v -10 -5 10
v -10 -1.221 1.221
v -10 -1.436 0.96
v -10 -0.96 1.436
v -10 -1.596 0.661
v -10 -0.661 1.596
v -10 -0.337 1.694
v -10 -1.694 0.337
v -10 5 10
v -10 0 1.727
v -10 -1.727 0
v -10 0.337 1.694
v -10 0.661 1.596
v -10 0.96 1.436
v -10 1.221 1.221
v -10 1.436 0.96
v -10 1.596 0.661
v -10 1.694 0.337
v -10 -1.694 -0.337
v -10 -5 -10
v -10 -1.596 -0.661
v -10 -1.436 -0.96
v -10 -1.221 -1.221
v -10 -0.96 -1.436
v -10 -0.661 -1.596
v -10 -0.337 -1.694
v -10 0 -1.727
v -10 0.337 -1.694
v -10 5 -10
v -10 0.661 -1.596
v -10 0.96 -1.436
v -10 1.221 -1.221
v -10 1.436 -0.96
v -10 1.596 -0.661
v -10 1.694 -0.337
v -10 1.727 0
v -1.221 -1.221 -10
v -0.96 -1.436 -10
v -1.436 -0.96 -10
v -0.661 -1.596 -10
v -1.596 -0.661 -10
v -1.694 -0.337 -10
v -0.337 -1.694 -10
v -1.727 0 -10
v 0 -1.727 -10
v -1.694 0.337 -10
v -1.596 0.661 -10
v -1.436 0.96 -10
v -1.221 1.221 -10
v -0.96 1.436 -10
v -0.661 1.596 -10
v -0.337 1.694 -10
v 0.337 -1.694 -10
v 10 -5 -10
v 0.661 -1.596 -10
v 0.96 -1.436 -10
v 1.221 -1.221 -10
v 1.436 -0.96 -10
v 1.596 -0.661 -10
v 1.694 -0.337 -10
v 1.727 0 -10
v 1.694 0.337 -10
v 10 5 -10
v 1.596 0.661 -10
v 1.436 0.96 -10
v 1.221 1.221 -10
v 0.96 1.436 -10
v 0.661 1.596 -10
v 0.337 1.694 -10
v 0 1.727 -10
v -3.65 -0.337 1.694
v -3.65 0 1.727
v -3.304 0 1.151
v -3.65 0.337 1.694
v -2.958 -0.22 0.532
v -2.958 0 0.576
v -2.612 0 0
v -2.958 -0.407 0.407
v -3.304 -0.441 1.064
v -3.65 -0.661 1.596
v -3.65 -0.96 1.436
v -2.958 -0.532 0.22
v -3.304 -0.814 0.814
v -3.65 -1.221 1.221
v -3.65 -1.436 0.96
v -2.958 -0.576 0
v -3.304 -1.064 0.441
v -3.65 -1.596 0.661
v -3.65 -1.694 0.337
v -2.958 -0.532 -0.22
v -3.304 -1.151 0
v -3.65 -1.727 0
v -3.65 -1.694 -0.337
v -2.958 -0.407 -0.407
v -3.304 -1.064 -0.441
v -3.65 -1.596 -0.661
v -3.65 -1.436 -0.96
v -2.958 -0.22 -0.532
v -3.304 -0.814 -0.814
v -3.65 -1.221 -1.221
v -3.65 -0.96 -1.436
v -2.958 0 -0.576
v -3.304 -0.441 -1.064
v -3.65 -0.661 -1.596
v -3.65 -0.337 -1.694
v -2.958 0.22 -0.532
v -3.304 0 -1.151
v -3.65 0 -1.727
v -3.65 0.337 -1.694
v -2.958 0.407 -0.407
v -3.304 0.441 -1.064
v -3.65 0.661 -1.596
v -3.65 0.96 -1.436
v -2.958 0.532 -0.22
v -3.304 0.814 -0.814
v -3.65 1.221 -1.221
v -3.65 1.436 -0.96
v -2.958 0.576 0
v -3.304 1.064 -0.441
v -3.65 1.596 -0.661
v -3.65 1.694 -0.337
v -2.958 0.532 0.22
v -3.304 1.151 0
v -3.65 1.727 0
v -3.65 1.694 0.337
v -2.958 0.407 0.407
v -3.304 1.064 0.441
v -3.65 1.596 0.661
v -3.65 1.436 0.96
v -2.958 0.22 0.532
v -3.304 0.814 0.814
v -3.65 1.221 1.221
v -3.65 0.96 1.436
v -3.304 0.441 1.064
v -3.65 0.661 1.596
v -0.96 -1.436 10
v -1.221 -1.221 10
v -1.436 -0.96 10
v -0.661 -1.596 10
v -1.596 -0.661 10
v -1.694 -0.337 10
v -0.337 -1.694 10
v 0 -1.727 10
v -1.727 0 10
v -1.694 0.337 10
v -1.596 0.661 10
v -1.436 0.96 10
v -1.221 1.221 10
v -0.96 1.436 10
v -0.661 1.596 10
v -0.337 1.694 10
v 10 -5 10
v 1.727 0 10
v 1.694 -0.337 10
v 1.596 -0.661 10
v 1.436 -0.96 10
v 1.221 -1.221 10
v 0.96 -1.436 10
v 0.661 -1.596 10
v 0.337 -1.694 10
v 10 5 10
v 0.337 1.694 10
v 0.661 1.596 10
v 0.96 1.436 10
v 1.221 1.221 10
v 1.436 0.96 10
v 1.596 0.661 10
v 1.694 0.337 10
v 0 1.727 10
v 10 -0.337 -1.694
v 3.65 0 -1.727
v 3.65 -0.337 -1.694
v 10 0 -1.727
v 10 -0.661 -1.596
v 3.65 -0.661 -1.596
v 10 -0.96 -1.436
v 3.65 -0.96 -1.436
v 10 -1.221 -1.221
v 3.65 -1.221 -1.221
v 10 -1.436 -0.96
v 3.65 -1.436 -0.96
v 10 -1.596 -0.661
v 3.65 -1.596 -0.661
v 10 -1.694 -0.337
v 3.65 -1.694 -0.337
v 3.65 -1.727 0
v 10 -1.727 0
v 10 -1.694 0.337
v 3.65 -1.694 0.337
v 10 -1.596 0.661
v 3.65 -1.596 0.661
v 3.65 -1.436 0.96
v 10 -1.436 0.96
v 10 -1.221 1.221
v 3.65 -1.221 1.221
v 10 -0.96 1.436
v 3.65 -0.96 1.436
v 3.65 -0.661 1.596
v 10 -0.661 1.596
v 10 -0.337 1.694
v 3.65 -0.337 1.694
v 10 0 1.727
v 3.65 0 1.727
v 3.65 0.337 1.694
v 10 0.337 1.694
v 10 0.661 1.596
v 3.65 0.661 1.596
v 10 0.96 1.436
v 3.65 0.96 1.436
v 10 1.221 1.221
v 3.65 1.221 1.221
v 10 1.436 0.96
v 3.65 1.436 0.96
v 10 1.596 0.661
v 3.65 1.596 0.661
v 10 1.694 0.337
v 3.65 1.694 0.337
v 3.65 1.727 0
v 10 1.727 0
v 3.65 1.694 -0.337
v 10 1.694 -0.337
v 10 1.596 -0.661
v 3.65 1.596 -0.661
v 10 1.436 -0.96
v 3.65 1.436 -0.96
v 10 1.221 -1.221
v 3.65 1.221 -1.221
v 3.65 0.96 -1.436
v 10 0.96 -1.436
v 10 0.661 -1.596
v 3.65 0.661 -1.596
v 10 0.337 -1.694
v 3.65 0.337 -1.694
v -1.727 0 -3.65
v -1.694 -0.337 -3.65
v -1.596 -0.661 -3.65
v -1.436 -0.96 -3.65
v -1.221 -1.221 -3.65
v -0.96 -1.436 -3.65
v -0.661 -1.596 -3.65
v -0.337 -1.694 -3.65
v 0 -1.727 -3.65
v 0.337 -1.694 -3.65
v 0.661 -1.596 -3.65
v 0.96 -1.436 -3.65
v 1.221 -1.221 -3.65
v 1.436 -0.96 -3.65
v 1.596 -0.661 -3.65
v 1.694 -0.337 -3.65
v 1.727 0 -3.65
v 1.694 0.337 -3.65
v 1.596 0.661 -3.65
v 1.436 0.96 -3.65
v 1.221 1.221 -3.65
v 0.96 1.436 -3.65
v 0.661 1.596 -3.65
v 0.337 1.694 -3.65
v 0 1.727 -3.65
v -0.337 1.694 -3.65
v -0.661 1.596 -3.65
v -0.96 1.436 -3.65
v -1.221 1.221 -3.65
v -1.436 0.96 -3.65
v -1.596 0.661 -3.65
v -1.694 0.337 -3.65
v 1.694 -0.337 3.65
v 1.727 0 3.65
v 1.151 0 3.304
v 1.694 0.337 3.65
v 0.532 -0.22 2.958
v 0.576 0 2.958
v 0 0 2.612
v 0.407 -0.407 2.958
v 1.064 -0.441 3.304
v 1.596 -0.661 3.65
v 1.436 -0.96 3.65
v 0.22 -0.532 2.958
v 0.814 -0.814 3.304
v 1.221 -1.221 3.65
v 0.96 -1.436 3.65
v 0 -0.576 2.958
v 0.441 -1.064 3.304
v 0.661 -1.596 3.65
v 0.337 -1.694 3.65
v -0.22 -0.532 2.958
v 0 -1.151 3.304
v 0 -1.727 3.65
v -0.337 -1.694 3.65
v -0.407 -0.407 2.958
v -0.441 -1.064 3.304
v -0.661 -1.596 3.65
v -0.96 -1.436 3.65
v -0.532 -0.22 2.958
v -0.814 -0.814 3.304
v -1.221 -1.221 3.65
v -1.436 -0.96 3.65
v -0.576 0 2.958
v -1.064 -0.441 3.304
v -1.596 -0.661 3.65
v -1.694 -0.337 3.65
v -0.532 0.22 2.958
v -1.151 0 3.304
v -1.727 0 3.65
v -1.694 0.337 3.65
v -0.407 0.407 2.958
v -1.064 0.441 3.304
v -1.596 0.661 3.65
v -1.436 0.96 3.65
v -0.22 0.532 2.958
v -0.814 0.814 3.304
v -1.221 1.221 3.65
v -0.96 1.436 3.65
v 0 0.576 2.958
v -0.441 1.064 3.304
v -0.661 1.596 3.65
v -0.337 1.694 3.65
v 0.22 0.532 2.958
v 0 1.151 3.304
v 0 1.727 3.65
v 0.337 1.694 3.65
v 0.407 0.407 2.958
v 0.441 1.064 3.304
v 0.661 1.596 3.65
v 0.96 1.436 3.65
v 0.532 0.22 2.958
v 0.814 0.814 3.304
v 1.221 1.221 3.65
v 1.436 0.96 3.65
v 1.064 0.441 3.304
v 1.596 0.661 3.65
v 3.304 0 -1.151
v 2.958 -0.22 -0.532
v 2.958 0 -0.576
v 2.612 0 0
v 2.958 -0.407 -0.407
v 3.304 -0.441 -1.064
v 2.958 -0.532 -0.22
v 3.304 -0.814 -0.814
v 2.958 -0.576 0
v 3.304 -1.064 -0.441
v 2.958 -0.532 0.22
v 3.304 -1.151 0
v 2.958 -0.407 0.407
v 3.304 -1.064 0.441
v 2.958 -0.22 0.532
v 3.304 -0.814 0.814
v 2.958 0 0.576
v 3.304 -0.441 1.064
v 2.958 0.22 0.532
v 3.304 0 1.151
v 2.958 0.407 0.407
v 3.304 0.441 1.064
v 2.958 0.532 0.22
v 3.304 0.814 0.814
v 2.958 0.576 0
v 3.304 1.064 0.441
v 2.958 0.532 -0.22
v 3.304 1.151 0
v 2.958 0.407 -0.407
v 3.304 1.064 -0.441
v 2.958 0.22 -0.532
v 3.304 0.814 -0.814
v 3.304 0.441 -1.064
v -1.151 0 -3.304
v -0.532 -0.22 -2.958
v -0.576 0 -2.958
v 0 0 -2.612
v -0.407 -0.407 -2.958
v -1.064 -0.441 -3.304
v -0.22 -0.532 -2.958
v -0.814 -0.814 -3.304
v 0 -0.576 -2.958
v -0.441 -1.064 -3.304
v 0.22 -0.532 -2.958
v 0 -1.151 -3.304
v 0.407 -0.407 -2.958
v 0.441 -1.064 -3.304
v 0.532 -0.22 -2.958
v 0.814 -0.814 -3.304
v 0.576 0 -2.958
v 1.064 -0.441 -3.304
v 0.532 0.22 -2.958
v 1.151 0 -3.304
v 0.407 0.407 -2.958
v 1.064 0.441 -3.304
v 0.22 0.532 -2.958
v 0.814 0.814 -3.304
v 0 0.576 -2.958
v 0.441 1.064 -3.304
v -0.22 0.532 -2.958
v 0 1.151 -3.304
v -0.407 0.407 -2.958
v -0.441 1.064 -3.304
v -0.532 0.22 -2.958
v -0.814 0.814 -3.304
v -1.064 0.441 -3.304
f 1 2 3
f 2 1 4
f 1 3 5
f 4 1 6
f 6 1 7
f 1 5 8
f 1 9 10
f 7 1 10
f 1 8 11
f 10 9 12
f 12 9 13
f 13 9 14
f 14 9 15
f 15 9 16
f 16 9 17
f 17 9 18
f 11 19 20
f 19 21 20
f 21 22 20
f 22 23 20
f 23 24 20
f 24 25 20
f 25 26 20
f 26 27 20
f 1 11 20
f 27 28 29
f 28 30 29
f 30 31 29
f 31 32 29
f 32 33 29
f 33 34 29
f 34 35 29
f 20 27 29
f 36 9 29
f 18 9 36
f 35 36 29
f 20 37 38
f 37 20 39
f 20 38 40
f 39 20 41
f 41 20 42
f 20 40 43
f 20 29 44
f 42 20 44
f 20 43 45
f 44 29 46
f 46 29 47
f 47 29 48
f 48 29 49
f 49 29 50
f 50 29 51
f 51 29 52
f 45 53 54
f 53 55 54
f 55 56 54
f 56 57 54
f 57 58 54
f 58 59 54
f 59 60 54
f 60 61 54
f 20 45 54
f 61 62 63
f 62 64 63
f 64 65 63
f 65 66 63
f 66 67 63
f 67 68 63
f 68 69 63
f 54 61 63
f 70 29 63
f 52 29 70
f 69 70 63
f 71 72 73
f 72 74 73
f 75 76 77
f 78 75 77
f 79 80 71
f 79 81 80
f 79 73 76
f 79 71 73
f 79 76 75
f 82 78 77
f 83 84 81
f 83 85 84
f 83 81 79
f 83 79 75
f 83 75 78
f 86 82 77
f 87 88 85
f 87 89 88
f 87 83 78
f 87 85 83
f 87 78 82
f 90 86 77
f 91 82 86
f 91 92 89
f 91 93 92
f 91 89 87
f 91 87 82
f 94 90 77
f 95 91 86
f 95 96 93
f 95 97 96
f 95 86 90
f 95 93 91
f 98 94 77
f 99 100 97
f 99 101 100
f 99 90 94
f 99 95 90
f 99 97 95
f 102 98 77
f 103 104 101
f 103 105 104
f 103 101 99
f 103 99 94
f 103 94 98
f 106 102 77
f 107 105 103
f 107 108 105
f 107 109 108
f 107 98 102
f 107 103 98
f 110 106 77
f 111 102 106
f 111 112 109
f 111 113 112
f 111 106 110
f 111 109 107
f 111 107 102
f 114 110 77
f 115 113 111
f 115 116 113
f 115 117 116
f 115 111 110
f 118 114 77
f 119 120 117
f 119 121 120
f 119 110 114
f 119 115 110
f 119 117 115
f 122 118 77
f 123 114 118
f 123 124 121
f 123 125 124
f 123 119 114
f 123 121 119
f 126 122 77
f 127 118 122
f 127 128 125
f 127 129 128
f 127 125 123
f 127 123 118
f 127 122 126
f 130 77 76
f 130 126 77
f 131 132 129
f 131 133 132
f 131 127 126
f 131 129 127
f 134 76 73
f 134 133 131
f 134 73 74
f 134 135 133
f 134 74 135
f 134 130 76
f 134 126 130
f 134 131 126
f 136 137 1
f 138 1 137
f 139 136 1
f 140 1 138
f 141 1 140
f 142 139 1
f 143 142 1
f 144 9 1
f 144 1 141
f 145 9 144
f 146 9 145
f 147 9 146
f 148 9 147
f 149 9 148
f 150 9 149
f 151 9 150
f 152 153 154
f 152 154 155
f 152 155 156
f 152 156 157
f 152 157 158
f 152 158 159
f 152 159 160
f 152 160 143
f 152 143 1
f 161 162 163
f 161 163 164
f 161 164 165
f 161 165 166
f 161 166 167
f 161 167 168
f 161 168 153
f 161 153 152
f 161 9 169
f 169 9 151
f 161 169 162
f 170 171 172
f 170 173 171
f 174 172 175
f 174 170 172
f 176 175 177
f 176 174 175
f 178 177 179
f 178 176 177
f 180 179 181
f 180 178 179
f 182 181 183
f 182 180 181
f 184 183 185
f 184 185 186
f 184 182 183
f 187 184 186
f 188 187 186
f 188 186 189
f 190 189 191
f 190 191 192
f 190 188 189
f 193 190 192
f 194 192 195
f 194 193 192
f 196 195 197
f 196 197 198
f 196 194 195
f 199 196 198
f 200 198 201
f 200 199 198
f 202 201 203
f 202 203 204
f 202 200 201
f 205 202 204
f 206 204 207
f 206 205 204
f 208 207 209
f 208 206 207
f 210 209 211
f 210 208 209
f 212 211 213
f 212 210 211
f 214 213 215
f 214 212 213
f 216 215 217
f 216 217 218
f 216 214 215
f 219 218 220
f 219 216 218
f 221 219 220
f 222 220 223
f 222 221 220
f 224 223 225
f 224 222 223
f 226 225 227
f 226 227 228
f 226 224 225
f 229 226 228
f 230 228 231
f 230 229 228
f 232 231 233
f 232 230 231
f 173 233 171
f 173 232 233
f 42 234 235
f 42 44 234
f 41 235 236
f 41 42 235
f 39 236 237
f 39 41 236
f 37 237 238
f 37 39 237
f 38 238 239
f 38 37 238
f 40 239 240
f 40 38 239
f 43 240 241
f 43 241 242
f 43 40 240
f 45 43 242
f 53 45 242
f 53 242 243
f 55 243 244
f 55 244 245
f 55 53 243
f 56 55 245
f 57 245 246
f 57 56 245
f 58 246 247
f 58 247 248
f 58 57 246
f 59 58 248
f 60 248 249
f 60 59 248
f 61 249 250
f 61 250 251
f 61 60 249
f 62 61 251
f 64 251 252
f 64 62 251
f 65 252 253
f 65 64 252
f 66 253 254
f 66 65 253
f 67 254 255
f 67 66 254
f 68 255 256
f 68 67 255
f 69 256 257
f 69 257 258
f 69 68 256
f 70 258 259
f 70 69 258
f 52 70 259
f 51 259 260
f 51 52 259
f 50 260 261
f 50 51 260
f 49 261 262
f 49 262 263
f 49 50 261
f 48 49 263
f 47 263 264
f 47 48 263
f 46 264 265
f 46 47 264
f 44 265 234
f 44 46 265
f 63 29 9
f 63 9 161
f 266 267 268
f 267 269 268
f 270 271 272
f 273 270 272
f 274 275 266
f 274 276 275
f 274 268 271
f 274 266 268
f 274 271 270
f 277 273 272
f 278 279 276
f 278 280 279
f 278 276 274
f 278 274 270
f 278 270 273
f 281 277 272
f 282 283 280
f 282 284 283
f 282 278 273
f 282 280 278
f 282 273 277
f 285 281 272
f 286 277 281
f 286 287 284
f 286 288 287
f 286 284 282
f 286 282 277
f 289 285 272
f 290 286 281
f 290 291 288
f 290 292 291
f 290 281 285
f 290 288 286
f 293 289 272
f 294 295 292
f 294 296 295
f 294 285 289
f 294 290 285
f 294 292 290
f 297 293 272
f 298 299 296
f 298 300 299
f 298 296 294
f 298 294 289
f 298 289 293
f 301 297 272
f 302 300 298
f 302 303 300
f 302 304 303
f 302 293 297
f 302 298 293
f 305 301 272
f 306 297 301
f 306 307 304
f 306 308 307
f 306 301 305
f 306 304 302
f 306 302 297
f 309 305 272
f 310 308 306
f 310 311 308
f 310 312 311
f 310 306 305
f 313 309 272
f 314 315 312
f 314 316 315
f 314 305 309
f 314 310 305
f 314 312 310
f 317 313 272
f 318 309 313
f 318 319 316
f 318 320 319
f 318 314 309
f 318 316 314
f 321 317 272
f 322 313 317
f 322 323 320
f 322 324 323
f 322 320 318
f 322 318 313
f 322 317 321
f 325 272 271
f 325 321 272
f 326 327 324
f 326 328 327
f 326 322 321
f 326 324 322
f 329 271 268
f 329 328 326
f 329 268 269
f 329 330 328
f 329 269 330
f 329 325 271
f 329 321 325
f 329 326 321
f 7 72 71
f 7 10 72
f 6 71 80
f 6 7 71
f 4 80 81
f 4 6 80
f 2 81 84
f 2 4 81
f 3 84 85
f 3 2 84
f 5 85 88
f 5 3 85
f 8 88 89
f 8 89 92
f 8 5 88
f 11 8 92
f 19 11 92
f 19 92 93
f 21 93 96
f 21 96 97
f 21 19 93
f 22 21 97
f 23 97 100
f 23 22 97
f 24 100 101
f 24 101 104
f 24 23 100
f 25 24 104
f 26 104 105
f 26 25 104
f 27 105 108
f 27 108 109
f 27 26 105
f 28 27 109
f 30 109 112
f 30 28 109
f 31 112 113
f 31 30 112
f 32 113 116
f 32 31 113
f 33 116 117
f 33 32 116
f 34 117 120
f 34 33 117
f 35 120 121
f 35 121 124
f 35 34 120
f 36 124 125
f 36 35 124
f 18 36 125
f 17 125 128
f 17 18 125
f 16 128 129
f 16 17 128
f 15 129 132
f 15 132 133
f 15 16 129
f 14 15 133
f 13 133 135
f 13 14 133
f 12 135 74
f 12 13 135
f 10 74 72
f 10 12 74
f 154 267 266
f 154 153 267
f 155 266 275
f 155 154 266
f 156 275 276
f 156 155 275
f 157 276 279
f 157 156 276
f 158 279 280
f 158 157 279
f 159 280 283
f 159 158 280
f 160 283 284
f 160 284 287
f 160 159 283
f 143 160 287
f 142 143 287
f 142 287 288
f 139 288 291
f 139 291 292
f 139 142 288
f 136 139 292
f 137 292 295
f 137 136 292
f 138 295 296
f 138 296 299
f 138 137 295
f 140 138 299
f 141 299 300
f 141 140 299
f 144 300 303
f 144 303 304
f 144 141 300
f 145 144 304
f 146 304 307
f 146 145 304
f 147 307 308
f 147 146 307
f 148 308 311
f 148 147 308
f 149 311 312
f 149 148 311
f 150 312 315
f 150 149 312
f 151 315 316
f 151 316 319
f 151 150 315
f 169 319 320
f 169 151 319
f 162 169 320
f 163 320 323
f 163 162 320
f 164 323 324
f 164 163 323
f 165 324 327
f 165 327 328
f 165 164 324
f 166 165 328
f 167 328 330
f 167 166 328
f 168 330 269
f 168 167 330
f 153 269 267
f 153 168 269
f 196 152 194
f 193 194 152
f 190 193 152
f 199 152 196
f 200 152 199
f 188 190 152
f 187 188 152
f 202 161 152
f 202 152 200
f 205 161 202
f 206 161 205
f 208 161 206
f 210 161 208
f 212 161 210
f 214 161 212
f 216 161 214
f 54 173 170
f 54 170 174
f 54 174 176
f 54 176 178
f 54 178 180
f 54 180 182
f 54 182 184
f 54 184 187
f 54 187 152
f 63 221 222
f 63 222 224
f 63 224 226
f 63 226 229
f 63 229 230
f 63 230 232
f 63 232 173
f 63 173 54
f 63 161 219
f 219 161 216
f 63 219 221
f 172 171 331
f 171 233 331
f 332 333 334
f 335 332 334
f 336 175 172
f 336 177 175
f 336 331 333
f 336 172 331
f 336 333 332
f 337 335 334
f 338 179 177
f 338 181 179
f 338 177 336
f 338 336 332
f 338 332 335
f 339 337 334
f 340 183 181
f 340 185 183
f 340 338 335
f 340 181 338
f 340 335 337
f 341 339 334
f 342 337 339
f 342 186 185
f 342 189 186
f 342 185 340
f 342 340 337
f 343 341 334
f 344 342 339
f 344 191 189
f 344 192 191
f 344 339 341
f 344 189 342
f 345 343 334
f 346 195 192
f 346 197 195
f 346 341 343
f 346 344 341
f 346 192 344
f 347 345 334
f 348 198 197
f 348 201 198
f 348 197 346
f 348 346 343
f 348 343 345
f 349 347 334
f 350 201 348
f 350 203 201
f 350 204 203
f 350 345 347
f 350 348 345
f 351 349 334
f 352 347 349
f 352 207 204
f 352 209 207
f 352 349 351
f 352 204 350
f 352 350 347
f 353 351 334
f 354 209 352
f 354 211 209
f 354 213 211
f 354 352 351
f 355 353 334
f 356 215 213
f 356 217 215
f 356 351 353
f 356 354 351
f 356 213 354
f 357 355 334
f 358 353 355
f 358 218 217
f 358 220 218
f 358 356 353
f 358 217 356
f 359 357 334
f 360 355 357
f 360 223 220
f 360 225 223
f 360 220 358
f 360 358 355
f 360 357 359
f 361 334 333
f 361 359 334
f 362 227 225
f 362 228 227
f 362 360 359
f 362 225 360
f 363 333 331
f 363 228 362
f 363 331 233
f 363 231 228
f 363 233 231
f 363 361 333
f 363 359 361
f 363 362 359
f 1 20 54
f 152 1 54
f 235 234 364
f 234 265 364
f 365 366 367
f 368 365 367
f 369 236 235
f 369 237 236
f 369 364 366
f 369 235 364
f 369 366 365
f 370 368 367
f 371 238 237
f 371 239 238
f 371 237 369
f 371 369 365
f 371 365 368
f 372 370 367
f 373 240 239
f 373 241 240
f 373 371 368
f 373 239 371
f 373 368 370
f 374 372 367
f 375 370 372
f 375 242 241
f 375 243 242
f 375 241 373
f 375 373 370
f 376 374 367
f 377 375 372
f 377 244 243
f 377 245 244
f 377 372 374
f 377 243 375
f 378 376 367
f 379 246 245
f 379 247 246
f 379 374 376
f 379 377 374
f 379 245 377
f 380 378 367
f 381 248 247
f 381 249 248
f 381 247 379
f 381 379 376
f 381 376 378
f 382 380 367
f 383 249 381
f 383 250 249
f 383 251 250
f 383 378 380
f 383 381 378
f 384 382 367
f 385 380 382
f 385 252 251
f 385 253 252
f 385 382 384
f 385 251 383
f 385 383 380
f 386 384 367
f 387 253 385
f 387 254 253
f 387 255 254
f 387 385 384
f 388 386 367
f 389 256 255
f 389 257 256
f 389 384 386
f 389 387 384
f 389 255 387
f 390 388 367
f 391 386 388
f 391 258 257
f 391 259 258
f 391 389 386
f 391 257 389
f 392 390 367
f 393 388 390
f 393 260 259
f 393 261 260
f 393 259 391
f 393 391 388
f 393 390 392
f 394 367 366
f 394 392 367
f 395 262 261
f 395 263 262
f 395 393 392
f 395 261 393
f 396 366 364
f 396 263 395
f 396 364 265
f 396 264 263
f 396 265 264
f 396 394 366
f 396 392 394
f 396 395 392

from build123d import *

# Parameters (mm, degrees)
SKETCH1_W           = 20
SKETCH1_H           = 20
BOSS_EXTRUDE1_DEPTH = 5
CIRPATTERN1_COUNT   = 4


with BuildPart() as part:
    # Sketch1 → Boss-Extrude1 (new, symmetric)
    with BuildSketch(Plane(origin=(0, 0, 0), x_dir=(1, 0, 0), z_dir=(0, 1, 0))):
        Rectangle(SKETCH1_W, SKETCH1_H)
    extrude(amount=BOSS_EXTRUDE1_DEPTH, both=True)

    # Sketch3 → #8-32 Tapped Hole1 (revolve, cut)
    with BuildSketch(Plane(origin=(10, 0, 0), x_dir=(0, 0, -1), z_dir=(0, 1, 0))):
        Polygon((0, 0), (0, 7.387806461), (1.7272, 6.35), (1.7272, 0), align=None)
    f_8_32_tapped_hole1 = revolve(axis=Axis((16.35, 0, 0), (-1, 0, 0)), mode=Mode.SUBTRACT)

    # CirPattern1: #8-32 Tapped Hole1 ×4 about axis
    cirpattern1_axis = Axis((0, 0, 0), (0, 1, 0))
    for i in range(1, CIRPATTERN1_COUNT):
        add(f_8_32_tapped_hole1.rotate(cirpattern1_axis, i * 360 / CIRPATTERN1_COUNT), mode=Mode.SUBTRACT)


solid = part.part
